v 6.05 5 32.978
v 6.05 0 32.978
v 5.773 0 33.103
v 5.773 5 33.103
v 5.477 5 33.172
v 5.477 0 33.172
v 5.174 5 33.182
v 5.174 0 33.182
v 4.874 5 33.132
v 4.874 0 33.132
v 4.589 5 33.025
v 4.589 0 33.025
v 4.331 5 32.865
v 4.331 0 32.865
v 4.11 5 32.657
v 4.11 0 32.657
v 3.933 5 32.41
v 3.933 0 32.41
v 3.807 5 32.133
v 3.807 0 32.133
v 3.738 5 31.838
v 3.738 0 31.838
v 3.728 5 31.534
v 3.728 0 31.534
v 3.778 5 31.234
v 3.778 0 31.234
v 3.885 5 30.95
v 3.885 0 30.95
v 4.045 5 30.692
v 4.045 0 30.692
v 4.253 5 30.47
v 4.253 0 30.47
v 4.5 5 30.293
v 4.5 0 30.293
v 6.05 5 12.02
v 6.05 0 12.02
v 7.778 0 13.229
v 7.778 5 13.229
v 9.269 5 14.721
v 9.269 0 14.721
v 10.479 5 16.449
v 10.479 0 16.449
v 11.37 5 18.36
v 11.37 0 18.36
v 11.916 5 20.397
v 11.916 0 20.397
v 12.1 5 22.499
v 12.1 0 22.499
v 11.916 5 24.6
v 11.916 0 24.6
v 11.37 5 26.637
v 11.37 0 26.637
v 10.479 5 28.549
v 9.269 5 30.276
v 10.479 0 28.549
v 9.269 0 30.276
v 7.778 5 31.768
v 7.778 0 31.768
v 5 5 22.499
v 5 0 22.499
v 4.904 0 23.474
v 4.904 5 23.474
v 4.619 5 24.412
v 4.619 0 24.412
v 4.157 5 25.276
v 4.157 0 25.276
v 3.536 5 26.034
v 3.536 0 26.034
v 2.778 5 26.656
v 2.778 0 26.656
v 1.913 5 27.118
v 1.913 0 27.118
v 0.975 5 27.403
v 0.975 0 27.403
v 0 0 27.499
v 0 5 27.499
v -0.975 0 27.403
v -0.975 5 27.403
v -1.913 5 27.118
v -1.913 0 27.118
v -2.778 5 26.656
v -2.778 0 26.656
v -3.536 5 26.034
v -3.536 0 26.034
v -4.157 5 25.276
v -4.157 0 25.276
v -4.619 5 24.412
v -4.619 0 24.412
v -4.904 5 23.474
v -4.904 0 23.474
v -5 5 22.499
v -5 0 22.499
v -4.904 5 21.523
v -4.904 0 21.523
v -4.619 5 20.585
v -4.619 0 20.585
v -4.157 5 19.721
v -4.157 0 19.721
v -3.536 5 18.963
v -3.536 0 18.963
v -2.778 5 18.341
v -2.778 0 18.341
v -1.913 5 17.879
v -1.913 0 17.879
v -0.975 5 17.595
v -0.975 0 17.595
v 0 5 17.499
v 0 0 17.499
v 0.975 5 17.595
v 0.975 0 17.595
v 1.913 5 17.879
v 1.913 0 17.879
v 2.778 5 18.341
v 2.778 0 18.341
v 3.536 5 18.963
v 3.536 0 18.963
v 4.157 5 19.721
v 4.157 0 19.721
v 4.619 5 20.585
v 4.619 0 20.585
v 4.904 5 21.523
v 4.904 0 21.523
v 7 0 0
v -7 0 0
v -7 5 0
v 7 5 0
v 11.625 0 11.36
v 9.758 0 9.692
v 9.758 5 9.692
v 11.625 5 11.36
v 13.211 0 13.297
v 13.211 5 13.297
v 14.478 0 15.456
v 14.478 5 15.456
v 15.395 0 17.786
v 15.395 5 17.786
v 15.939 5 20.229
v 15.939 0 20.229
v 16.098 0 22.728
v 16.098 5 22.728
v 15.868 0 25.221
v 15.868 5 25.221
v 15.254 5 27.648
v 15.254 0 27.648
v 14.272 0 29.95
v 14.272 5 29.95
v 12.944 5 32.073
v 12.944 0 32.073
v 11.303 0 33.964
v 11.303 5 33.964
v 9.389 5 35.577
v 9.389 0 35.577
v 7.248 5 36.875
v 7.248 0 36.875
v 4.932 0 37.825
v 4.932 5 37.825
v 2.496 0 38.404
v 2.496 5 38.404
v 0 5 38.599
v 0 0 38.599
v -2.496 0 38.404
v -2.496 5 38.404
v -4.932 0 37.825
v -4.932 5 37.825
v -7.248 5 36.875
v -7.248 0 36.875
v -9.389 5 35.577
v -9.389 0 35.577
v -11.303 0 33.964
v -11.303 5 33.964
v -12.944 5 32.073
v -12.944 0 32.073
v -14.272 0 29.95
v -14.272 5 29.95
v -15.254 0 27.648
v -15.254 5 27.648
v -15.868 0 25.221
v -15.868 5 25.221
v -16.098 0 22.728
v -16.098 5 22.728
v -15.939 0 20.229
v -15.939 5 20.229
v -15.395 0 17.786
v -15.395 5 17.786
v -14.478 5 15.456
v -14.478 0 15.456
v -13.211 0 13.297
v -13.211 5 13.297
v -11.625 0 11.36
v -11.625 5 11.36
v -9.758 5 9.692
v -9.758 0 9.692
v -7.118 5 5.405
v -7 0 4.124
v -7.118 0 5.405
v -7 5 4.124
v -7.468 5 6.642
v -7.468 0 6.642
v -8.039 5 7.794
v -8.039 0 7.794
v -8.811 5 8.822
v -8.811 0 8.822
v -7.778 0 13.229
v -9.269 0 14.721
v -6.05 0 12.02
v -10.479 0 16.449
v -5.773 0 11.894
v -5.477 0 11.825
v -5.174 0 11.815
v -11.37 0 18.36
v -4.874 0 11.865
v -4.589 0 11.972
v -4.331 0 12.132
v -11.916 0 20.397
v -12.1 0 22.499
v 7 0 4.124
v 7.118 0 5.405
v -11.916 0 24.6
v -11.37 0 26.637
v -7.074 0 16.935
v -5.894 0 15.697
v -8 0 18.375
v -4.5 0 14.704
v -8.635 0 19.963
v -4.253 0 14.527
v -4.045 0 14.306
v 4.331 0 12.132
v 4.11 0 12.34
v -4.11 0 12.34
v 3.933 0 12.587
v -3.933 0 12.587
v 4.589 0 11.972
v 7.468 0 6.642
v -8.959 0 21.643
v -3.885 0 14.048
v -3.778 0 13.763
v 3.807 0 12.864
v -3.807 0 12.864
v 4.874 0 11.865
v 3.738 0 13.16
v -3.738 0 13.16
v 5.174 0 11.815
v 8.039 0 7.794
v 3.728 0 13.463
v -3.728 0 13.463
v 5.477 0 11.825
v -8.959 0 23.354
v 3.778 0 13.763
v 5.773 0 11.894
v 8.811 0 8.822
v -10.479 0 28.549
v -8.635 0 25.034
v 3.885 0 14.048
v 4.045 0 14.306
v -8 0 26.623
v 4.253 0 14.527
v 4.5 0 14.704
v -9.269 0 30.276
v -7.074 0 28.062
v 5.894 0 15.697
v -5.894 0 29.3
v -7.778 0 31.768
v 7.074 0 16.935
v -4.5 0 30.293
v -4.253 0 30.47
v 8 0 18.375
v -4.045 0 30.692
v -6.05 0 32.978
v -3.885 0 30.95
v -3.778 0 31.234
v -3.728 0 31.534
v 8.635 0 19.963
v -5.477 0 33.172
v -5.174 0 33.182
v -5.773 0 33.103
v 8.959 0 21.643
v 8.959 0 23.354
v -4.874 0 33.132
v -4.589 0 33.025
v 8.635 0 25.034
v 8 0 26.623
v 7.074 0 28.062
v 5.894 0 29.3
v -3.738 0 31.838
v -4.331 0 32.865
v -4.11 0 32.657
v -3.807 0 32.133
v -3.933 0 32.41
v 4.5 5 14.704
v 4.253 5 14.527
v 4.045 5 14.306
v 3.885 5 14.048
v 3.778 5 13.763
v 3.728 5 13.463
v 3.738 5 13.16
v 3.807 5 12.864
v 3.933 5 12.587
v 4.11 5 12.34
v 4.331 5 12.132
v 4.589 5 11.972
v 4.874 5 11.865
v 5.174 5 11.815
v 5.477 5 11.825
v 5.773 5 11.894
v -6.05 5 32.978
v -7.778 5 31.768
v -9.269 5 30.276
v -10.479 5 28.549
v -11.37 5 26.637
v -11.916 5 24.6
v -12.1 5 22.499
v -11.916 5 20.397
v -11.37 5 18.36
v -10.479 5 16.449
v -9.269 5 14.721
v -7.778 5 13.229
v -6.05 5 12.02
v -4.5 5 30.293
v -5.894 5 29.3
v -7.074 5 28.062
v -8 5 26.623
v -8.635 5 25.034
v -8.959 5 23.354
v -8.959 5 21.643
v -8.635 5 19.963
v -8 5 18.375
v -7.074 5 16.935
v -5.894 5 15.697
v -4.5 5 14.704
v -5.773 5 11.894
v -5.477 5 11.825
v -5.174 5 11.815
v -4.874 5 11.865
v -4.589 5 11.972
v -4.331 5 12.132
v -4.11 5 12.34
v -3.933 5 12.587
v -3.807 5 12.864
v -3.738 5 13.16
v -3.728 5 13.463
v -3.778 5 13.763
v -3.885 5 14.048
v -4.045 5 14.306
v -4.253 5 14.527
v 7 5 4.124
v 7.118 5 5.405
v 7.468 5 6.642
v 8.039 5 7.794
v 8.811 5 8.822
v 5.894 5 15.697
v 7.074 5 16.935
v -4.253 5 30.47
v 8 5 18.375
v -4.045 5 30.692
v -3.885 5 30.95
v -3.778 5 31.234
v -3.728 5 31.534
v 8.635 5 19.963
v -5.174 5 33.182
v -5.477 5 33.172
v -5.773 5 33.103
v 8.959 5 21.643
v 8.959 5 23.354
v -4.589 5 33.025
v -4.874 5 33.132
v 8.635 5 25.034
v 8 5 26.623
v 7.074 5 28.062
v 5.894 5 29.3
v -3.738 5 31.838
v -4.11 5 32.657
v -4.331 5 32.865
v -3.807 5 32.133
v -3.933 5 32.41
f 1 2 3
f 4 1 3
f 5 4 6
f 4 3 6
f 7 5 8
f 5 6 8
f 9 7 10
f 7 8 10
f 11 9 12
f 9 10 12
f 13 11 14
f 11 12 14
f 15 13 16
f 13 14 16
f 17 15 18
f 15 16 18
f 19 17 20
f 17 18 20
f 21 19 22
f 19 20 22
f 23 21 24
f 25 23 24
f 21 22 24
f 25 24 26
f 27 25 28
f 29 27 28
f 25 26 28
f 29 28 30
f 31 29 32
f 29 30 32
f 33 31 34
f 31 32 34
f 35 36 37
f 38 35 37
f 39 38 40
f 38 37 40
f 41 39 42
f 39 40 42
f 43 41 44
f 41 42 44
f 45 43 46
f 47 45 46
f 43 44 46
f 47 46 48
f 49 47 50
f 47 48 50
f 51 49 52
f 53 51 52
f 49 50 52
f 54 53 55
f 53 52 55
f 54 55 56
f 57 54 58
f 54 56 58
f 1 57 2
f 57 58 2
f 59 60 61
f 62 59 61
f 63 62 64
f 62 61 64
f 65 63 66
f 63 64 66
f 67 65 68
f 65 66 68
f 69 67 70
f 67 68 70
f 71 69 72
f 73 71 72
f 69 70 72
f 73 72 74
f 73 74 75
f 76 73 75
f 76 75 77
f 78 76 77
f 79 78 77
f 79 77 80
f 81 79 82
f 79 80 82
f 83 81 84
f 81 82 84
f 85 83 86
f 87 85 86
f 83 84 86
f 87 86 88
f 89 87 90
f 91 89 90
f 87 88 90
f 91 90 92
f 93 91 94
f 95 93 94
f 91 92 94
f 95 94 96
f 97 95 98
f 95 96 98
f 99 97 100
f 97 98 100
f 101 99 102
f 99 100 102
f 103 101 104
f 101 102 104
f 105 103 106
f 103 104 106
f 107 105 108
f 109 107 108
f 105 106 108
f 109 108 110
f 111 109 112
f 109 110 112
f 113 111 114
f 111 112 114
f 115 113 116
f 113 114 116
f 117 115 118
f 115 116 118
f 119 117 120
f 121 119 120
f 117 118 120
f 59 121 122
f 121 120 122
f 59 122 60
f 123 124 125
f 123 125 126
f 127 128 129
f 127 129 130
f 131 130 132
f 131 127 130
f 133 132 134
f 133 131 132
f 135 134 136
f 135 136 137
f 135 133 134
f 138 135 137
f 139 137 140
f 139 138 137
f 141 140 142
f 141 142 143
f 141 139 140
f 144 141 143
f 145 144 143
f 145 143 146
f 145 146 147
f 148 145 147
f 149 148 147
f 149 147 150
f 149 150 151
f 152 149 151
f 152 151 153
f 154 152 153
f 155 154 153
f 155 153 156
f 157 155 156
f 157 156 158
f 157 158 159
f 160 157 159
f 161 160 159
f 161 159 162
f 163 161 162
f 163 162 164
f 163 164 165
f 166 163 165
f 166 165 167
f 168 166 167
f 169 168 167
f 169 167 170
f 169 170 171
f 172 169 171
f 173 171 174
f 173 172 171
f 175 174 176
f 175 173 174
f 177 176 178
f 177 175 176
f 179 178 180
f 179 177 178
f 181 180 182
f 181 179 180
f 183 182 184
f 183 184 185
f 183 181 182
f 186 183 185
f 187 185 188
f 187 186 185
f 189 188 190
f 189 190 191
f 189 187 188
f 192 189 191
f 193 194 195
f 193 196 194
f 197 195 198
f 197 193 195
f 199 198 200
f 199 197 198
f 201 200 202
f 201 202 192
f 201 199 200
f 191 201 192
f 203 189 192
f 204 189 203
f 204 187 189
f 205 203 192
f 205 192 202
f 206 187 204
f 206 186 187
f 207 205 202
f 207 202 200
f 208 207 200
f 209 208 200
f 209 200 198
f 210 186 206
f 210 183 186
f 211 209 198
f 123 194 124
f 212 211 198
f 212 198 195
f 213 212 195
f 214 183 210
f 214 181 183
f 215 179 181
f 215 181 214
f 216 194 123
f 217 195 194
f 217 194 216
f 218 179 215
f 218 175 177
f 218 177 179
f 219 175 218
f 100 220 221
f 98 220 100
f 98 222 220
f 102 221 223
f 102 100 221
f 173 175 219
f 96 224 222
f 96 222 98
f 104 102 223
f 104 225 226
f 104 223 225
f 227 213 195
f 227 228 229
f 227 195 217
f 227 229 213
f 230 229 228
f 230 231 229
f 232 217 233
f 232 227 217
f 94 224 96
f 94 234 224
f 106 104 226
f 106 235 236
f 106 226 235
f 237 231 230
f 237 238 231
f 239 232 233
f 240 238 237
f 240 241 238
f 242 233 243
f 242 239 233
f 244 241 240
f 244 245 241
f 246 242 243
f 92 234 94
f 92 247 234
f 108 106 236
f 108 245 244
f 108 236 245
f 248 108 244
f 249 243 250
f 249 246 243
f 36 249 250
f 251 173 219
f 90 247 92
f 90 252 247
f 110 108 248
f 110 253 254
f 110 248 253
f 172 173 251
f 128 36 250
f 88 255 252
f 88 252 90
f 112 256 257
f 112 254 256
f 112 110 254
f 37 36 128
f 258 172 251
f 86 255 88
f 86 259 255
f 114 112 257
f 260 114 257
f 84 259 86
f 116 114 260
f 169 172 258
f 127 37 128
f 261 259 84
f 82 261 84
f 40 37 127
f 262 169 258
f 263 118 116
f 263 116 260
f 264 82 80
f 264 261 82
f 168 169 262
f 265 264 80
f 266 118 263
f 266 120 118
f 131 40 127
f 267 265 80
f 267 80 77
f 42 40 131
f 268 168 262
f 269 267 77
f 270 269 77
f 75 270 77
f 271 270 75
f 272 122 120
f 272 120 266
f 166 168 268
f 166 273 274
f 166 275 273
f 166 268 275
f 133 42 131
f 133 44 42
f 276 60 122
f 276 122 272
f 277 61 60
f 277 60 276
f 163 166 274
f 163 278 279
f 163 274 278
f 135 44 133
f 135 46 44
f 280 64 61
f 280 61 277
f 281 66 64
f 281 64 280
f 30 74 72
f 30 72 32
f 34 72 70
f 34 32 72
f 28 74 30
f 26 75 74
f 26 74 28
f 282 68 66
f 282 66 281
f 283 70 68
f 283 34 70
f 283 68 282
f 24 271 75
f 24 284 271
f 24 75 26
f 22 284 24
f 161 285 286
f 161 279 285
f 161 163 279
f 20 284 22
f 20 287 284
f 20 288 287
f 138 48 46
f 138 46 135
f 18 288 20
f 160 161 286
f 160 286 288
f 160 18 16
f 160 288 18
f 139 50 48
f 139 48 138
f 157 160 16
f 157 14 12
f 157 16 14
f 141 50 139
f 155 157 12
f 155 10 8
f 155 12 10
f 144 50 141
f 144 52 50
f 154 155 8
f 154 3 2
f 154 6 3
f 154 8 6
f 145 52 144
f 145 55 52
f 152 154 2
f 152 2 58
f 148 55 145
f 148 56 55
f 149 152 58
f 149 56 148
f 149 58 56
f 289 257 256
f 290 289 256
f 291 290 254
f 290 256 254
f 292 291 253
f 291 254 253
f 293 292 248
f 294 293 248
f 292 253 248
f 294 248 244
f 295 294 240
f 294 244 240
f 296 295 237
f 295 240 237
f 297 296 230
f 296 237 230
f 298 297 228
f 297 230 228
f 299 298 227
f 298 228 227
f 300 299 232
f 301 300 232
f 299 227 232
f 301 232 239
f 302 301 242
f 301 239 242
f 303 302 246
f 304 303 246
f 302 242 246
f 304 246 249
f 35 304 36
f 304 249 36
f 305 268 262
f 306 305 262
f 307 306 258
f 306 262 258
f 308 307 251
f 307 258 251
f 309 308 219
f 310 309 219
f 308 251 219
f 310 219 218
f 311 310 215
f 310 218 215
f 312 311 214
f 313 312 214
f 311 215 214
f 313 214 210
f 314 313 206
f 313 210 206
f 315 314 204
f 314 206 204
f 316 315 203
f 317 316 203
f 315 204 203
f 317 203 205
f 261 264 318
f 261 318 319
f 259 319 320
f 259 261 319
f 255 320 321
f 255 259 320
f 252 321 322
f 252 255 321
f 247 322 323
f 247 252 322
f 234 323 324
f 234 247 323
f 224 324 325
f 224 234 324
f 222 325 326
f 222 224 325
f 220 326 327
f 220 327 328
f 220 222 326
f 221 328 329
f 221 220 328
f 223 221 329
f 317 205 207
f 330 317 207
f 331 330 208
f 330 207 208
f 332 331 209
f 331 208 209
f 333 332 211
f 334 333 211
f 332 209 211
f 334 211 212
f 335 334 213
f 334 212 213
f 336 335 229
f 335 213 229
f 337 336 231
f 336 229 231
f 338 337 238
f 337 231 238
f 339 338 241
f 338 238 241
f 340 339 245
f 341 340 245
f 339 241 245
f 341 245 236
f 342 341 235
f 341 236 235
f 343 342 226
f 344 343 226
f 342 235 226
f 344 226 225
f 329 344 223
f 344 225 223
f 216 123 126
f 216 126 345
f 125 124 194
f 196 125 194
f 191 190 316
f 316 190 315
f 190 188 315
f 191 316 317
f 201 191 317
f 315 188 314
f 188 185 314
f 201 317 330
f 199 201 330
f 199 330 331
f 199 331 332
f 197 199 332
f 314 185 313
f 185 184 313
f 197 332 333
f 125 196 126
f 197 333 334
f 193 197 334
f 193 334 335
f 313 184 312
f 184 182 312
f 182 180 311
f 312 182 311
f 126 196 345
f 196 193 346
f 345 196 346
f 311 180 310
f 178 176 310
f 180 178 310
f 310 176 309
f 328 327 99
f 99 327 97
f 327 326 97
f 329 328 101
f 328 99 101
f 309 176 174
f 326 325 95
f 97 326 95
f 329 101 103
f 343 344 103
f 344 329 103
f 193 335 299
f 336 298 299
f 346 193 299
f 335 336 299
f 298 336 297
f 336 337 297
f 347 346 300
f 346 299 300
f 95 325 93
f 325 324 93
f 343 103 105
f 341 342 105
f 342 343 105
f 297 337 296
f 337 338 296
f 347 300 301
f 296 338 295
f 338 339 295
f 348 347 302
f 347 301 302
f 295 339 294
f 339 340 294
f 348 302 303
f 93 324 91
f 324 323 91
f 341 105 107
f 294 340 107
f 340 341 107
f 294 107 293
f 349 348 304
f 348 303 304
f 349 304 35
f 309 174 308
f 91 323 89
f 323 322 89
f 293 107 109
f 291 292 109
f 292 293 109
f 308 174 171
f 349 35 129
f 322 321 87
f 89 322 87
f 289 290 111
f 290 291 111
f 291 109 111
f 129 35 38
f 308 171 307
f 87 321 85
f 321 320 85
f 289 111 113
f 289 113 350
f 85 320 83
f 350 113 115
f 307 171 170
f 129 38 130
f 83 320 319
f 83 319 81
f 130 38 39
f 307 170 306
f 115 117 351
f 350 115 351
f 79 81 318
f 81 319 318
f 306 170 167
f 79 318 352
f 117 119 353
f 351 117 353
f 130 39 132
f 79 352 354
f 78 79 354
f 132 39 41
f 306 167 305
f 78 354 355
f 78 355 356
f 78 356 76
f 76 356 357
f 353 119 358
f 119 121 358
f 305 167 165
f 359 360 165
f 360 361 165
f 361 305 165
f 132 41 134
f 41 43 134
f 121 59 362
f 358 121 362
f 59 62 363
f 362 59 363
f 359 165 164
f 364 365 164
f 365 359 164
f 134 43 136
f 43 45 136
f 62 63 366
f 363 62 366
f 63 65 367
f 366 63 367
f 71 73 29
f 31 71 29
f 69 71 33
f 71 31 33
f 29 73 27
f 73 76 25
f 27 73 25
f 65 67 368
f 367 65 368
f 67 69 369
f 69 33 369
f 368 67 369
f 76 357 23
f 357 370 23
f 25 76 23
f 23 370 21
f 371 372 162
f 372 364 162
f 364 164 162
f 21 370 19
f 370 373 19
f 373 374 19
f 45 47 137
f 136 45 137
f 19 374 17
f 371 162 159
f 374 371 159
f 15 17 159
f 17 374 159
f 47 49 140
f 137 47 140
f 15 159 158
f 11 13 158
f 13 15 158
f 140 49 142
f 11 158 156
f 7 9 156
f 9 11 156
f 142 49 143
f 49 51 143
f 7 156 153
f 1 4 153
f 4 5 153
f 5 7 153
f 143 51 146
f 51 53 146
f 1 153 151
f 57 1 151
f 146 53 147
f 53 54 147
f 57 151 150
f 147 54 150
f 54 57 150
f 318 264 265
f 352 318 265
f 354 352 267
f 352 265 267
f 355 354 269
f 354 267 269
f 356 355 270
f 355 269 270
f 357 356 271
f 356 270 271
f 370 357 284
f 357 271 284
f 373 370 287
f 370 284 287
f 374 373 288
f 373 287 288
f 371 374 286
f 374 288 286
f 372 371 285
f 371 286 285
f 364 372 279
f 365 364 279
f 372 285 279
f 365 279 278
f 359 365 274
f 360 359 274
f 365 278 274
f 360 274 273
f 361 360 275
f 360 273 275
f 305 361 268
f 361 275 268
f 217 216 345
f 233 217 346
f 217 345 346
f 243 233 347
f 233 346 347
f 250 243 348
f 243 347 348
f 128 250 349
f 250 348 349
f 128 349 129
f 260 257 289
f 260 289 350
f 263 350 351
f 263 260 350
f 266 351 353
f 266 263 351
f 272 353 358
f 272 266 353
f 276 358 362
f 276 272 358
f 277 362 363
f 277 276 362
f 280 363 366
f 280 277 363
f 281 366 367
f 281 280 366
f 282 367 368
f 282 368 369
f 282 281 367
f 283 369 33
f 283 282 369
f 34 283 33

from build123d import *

# Parameters (mm, degrees)
SKETCH001_AS_DRAWN_R                 = 5
EXTRUDE001_DEPTH                     = 5
EXTRUDE001_ONTO_SKETCH001_ROLL_ANGLE = 90
FILLET_R                             = 7


with BuildPart() as part:
    # Sketch001 as drawn → Extrude001 (new)
    with BuildSketch(Plane.XY):
        with BuildLine():
            Line((-7, 0), (7, 0))
            Line((7, 0), (7, 8))
            ThreePointArc((7, 8), (0, 38.598621), (-7, 8))
            Line((-7, 0), (-7, 8))
        make_face()
        with Locations((0, 22.498621)):
            Circle(SKETCH001_AS_DRAWN_R, mode=Mode.SUBTRACT)
        with BuildLine():
            ThreePointArc((-6.05, 32.977528), (-12.1, 22.498621), (-6.05, 12.019713))
            ThreePointArc((-6.05, 12.019713), (-3.932661, 12.587053), (-4.5, 14.704392))
            ThreePointArc((-4.5, 30.292849), (-9, 22.498621), (-4.5, 14.704392))
            ThreePointArc((-4.5, 30.292849), (-3.932661, 32.410189), (-6.05, 32.977528))
        make_face(mode=Mode.SUBTRACT)
        with BuildLine():
            ThreePointArc((4.5, 14.704392), (9, 22.498621), (4.5, 30.292849))
            ThreePointArc((6.05, 32.977528), (3.932661, 32.410189), (4.5, 30.292849))
            ThreePointArc((6.05, 12.019713), (12.1, 22.498621), (6.05, 32.977528))
            ThreePointArc((4.5, 14.704392), (3.932661, 12.587053), (6.05, 12.019713))
        make_face(mode=Mode.SUBTRACT)
    extrude(amount=-EXTRUDE001_DEPTH)


with BuildPart() as part_1:
    # Extrude001 onto Sketch001 roll: moved
    add(part.part.rotate(Axis((0, 0, 0), (1, 0, 0)), EXTRUDE001_ONTO_SKETCH001_ROLL_ANGLE))


with BuildPart() as part_2:
    # Extrude001 onto Sketch001 placement: moved
    add(part_1.part)

    # Fillet
    fillet_edges = [part_2.edges().sort_by_distance(p)[0] for p in [
        (7, 2.5, 8),
        (-7, 2.5, 8),
    ]]
    fillet(fillet_edges, radius=FILLET_R)


solid = part_2.part
